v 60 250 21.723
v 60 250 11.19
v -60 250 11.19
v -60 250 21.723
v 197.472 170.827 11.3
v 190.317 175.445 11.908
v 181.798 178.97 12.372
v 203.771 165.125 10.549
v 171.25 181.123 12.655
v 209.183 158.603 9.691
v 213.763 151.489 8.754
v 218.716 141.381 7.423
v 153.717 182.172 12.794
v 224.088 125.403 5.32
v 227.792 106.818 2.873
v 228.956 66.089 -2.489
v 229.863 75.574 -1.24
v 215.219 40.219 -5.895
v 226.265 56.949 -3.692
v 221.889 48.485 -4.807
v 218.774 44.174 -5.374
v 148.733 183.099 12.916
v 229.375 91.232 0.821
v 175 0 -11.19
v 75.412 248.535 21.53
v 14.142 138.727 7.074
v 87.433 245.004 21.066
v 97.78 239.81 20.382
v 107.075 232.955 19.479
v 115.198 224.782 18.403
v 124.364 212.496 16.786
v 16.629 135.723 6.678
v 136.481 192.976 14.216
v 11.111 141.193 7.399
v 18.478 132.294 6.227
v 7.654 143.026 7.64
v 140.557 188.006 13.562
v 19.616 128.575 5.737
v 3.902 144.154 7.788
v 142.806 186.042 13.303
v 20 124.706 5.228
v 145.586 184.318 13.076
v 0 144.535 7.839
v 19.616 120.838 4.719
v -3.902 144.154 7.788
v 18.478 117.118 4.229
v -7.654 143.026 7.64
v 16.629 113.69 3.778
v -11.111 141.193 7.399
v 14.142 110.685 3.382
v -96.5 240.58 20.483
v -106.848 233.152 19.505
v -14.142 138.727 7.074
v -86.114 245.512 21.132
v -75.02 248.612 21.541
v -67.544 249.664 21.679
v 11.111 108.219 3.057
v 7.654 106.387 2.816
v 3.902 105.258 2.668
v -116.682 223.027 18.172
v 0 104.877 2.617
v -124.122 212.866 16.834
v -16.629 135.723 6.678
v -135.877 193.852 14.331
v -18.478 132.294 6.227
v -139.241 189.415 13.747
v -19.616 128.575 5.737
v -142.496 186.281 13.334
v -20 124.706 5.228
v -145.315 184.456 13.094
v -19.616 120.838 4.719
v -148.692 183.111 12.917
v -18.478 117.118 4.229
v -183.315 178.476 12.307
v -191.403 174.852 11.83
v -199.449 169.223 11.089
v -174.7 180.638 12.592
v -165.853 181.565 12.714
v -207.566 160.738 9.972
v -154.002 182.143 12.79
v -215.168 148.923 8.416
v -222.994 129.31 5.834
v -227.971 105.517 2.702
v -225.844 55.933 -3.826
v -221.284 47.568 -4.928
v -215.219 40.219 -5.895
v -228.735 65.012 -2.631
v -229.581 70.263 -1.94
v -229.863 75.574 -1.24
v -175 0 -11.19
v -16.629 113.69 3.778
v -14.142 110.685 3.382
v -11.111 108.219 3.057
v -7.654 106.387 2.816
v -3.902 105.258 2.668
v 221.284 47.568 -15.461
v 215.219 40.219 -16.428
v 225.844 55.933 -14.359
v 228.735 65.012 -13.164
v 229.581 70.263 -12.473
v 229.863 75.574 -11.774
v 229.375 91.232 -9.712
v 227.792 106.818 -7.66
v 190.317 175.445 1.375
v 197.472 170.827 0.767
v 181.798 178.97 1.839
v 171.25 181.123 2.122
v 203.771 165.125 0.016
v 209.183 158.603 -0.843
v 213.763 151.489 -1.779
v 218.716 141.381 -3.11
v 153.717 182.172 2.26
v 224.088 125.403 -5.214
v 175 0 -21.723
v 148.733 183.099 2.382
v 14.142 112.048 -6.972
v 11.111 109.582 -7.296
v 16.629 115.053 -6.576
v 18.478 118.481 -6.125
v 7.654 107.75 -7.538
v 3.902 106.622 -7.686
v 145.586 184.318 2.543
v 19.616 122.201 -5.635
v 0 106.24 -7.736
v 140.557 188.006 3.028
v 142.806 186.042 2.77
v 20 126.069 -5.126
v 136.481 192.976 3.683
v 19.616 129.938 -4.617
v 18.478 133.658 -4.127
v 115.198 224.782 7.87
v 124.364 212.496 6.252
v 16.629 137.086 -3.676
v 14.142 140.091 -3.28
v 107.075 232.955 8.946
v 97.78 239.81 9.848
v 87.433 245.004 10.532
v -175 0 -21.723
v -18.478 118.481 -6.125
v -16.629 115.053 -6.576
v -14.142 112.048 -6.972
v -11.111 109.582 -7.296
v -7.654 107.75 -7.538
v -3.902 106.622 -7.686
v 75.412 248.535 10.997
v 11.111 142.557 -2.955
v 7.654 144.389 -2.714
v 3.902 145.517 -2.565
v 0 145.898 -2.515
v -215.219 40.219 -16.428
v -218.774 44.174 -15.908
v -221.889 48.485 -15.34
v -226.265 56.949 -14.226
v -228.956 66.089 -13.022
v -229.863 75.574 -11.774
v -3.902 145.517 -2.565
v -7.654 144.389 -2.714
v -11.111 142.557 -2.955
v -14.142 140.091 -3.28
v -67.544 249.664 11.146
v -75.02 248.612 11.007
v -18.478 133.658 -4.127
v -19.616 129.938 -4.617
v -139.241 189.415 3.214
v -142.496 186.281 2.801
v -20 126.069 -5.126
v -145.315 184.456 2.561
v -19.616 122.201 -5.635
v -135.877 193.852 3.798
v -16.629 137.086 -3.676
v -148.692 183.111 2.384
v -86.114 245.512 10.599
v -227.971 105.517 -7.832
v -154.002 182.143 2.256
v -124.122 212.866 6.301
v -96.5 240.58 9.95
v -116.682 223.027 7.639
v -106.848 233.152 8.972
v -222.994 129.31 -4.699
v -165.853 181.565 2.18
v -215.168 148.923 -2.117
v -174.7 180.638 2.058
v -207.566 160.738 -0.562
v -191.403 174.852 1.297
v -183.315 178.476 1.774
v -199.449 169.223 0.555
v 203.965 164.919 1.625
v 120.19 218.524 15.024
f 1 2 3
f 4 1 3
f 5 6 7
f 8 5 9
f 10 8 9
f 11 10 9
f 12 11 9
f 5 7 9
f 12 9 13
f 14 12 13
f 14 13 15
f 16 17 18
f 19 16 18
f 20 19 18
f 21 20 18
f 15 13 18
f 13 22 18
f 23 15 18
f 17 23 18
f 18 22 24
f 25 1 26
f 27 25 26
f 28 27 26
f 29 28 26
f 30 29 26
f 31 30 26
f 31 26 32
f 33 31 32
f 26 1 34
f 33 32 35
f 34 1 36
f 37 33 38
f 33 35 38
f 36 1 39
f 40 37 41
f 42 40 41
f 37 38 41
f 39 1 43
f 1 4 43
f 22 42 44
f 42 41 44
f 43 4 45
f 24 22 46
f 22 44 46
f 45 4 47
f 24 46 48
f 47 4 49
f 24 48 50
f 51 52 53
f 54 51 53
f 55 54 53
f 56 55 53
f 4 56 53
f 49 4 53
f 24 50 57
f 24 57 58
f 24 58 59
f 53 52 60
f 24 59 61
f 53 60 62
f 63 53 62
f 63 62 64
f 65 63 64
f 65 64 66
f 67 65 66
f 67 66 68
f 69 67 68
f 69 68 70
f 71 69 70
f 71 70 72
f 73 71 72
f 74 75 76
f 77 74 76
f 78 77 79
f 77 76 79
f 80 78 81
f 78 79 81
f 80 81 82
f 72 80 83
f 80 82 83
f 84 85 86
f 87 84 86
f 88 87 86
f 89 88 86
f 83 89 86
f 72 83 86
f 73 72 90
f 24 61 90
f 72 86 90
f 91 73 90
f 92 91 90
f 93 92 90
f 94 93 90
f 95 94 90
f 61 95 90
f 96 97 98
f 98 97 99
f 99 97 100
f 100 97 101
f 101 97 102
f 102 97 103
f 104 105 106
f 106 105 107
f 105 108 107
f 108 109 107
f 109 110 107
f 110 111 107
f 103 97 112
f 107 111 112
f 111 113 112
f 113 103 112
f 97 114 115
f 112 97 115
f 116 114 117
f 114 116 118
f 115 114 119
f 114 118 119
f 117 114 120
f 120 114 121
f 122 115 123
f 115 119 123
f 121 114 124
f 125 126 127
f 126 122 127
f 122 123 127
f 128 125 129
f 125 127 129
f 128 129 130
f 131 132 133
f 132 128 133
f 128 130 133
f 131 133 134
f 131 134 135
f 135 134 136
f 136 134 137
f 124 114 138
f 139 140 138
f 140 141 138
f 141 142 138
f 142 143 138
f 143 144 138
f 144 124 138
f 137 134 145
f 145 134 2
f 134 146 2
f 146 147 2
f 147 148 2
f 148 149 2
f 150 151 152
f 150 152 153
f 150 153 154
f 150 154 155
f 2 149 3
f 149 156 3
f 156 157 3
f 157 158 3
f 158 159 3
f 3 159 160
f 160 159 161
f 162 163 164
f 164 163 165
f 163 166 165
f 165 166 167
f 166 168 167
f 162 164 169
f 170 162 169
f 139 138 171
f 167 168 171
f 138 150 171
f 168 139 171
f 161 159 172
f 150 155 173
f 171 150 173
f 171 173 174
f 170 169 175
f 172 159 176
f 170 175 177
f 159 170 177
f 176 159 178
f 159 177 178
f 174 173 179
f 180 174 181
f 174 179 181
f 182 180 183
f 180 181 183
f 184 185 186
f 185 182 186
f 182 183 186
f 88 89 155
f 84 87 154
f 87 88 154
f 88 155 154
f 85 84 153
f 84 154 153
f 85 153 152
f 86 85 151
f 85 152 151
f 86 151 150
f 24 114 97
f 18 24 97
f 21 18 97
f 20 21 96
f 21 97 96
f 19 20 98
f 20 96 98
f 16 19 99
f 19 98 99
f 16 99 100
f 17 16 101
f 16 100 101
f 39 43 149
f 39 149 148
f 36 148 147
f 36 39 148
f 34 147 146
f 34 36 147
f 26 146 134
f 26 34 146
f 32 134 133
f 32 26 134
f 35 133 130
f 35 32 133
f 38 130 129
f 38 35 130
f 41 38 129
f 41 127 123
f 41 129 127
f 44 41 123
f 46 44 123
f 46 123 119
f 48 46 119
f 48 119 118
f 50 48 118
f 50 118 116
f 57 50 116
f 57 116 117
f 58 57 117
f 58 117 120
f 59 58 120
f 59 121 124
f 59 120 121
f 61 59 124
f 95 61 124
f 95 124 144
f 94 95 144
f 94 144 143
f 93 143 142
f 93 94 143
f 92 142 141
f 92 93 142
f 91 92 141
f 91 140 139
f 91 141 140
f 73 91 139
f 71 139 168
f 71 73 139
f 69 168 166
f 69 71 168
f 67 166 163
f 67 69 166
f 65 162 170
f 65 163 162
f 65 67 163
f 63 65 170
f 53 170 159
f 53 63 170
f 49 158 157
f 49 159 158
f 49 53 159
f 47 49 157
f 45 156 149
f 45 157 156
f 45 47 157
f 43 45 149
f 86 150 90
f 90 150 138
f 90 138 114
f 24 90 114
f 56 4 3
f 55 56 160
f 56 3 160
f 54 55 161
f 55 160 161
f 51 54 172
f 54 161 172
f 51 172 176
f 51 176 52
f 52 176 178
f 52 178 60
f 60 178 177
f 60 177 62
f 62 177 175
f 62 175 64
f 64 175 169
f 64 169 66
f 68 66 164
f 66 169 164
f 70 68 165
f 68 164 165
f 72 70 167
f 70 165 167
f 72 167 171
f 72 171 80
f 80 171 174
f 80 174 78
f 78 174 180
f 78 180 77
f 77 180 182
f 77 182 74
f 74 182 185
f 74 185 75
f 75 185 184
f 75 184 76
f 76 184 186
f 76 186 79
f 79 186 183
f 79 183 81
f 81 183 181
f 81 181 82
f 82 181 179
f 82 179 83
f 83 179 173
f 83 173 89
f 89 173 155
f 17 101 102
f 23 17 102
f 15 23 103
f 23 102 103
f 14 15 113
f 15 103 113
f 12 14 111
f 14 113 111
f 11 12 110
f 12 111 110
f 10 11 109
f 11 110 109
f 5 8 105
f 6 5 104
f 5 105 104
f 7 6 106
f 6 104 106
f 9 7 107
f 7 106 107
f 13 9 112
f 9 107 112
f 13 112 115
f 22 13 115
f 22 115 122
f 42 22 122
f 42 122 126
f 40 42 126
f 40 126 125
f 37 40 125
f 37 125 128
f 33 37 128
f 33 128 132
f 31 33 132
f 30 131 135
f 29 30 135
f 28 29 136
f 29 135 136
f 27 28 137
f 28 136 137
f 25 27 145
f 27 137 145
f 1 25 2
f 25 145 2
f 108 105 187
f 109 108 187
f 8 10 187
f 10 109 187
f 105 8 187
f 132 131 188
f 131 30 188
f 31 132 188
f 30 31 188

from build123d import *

# Parameters (mm, degrees)
BOSS_EXTRUDE1_START     = -25
BOSS_EXTRUDE1_DEPTH     = 50
CUT_EXTRUDE1_DEPTH      = 341.53226913
CUT_EXTRUDE1_DEPTH_BACK = 341.53226913
CUT_EXTRUDE2_DEPTH      = 341.286795308
CUT_EXTRUDE2_DEPTH_BACK = 341.286795308
SKETCH4_R               = 20


# Read off the part's stored shape, not the designer's step: Boss-Extrude1
with BuildPart() as part:
    # Boss-Extrude1 outline → Boss-Extrude1 (new body)
    with BuildSketch(Plane.XY.offset(BOSS_EXTRUDE1_START)):
        with BuildLine():
            Line((175, 0), (215.218833807, 40.218833807))
            ThreePointArc((215.218833807, 40.218833807), (226.057471223, 56.440000887), (229.863494748, 75.574172084))
            add(Edge.make_bspline(
                [(229.863494748, 75.574172084), (229.863497015, 220.574172084), (130.657195822, 208), (130.657198498, 108), (160, 250), (60, 250)],
                knots=[0, 0, 0, 0, 0, 0, 1, 1, 1, 1, 1, 1], degree=5))
            Line((60, 250), (-60, 250))
            add(Edge.make_bspline(
                [(-60, 250), (-160, 250), (-130.657198498, 108), (-130.657195822, 208), (-229.863497015, 220.574172084), (-229.863494748, 75.574172084)],
                knots=[0, 0, 0, 0, 0, 0, 1, 1, 1, 1, 1, 1], degree=5))
            ThreePointArc((-229.863494748, 75.574172084), (-226.057471223, 56.440000887), (-215.218833807, 40.218833807))
            Line((-215.218833807, 40.218833807), (-175, 0))
            Line((-175, 0), (175, 0))
        make_face()
    extrude(amount=BOSS_EXTRUDE1_DEPTH)

    # Sketch2 → Cut-Extrude1 (cut, two sides: drawn at the far end of the back side and taken through both)
    with BuildSketch(Plane(origin=(0, 0, 0), x_dir=(0, 0, -1), z_dir=(1, 0, 0)).offset(-CUT_EXTRUDE1_DEPTH_BACK)):
        Polygon((23.039732542, -10), (-12.506441807, 260), (35, 260), (35, -10), align=None)
        Polygon((-23.039732542, 260), (12.506441807, -10), (-35, -10), (-35, 260), align=None)
    extrude(amount=CUT_EXTRUDE1_DEPTH + CUT_EXTRUDE1_DEPTH_BACK, mode=Mode.SUBTRACT)

    # Sketch4 → Cut-Extrude2 (cut, two sides: drawn at the far end of the back side and taken through both)
    with BuildSketch(Plane(origin=(0, 2.811189919, -21.353107392), x_dir=(-1, 0, 0), z_dir=(0, 0.13052619222005532, -0.99144486137381)).offset(-CUT_EXTRUDE2_DEPTH_BACK)):
        with Locations(Location((0, 124.321792579, 0), (0, 0, 90))):
            Circle(SKETCH4_R)
    extrude(amount=CUT_EXTRUDE2_DEPTH + CUT_EXTRUDE2_DEPTH_BACK, mode=Mode.SUBTRACT)


solid = part.part
